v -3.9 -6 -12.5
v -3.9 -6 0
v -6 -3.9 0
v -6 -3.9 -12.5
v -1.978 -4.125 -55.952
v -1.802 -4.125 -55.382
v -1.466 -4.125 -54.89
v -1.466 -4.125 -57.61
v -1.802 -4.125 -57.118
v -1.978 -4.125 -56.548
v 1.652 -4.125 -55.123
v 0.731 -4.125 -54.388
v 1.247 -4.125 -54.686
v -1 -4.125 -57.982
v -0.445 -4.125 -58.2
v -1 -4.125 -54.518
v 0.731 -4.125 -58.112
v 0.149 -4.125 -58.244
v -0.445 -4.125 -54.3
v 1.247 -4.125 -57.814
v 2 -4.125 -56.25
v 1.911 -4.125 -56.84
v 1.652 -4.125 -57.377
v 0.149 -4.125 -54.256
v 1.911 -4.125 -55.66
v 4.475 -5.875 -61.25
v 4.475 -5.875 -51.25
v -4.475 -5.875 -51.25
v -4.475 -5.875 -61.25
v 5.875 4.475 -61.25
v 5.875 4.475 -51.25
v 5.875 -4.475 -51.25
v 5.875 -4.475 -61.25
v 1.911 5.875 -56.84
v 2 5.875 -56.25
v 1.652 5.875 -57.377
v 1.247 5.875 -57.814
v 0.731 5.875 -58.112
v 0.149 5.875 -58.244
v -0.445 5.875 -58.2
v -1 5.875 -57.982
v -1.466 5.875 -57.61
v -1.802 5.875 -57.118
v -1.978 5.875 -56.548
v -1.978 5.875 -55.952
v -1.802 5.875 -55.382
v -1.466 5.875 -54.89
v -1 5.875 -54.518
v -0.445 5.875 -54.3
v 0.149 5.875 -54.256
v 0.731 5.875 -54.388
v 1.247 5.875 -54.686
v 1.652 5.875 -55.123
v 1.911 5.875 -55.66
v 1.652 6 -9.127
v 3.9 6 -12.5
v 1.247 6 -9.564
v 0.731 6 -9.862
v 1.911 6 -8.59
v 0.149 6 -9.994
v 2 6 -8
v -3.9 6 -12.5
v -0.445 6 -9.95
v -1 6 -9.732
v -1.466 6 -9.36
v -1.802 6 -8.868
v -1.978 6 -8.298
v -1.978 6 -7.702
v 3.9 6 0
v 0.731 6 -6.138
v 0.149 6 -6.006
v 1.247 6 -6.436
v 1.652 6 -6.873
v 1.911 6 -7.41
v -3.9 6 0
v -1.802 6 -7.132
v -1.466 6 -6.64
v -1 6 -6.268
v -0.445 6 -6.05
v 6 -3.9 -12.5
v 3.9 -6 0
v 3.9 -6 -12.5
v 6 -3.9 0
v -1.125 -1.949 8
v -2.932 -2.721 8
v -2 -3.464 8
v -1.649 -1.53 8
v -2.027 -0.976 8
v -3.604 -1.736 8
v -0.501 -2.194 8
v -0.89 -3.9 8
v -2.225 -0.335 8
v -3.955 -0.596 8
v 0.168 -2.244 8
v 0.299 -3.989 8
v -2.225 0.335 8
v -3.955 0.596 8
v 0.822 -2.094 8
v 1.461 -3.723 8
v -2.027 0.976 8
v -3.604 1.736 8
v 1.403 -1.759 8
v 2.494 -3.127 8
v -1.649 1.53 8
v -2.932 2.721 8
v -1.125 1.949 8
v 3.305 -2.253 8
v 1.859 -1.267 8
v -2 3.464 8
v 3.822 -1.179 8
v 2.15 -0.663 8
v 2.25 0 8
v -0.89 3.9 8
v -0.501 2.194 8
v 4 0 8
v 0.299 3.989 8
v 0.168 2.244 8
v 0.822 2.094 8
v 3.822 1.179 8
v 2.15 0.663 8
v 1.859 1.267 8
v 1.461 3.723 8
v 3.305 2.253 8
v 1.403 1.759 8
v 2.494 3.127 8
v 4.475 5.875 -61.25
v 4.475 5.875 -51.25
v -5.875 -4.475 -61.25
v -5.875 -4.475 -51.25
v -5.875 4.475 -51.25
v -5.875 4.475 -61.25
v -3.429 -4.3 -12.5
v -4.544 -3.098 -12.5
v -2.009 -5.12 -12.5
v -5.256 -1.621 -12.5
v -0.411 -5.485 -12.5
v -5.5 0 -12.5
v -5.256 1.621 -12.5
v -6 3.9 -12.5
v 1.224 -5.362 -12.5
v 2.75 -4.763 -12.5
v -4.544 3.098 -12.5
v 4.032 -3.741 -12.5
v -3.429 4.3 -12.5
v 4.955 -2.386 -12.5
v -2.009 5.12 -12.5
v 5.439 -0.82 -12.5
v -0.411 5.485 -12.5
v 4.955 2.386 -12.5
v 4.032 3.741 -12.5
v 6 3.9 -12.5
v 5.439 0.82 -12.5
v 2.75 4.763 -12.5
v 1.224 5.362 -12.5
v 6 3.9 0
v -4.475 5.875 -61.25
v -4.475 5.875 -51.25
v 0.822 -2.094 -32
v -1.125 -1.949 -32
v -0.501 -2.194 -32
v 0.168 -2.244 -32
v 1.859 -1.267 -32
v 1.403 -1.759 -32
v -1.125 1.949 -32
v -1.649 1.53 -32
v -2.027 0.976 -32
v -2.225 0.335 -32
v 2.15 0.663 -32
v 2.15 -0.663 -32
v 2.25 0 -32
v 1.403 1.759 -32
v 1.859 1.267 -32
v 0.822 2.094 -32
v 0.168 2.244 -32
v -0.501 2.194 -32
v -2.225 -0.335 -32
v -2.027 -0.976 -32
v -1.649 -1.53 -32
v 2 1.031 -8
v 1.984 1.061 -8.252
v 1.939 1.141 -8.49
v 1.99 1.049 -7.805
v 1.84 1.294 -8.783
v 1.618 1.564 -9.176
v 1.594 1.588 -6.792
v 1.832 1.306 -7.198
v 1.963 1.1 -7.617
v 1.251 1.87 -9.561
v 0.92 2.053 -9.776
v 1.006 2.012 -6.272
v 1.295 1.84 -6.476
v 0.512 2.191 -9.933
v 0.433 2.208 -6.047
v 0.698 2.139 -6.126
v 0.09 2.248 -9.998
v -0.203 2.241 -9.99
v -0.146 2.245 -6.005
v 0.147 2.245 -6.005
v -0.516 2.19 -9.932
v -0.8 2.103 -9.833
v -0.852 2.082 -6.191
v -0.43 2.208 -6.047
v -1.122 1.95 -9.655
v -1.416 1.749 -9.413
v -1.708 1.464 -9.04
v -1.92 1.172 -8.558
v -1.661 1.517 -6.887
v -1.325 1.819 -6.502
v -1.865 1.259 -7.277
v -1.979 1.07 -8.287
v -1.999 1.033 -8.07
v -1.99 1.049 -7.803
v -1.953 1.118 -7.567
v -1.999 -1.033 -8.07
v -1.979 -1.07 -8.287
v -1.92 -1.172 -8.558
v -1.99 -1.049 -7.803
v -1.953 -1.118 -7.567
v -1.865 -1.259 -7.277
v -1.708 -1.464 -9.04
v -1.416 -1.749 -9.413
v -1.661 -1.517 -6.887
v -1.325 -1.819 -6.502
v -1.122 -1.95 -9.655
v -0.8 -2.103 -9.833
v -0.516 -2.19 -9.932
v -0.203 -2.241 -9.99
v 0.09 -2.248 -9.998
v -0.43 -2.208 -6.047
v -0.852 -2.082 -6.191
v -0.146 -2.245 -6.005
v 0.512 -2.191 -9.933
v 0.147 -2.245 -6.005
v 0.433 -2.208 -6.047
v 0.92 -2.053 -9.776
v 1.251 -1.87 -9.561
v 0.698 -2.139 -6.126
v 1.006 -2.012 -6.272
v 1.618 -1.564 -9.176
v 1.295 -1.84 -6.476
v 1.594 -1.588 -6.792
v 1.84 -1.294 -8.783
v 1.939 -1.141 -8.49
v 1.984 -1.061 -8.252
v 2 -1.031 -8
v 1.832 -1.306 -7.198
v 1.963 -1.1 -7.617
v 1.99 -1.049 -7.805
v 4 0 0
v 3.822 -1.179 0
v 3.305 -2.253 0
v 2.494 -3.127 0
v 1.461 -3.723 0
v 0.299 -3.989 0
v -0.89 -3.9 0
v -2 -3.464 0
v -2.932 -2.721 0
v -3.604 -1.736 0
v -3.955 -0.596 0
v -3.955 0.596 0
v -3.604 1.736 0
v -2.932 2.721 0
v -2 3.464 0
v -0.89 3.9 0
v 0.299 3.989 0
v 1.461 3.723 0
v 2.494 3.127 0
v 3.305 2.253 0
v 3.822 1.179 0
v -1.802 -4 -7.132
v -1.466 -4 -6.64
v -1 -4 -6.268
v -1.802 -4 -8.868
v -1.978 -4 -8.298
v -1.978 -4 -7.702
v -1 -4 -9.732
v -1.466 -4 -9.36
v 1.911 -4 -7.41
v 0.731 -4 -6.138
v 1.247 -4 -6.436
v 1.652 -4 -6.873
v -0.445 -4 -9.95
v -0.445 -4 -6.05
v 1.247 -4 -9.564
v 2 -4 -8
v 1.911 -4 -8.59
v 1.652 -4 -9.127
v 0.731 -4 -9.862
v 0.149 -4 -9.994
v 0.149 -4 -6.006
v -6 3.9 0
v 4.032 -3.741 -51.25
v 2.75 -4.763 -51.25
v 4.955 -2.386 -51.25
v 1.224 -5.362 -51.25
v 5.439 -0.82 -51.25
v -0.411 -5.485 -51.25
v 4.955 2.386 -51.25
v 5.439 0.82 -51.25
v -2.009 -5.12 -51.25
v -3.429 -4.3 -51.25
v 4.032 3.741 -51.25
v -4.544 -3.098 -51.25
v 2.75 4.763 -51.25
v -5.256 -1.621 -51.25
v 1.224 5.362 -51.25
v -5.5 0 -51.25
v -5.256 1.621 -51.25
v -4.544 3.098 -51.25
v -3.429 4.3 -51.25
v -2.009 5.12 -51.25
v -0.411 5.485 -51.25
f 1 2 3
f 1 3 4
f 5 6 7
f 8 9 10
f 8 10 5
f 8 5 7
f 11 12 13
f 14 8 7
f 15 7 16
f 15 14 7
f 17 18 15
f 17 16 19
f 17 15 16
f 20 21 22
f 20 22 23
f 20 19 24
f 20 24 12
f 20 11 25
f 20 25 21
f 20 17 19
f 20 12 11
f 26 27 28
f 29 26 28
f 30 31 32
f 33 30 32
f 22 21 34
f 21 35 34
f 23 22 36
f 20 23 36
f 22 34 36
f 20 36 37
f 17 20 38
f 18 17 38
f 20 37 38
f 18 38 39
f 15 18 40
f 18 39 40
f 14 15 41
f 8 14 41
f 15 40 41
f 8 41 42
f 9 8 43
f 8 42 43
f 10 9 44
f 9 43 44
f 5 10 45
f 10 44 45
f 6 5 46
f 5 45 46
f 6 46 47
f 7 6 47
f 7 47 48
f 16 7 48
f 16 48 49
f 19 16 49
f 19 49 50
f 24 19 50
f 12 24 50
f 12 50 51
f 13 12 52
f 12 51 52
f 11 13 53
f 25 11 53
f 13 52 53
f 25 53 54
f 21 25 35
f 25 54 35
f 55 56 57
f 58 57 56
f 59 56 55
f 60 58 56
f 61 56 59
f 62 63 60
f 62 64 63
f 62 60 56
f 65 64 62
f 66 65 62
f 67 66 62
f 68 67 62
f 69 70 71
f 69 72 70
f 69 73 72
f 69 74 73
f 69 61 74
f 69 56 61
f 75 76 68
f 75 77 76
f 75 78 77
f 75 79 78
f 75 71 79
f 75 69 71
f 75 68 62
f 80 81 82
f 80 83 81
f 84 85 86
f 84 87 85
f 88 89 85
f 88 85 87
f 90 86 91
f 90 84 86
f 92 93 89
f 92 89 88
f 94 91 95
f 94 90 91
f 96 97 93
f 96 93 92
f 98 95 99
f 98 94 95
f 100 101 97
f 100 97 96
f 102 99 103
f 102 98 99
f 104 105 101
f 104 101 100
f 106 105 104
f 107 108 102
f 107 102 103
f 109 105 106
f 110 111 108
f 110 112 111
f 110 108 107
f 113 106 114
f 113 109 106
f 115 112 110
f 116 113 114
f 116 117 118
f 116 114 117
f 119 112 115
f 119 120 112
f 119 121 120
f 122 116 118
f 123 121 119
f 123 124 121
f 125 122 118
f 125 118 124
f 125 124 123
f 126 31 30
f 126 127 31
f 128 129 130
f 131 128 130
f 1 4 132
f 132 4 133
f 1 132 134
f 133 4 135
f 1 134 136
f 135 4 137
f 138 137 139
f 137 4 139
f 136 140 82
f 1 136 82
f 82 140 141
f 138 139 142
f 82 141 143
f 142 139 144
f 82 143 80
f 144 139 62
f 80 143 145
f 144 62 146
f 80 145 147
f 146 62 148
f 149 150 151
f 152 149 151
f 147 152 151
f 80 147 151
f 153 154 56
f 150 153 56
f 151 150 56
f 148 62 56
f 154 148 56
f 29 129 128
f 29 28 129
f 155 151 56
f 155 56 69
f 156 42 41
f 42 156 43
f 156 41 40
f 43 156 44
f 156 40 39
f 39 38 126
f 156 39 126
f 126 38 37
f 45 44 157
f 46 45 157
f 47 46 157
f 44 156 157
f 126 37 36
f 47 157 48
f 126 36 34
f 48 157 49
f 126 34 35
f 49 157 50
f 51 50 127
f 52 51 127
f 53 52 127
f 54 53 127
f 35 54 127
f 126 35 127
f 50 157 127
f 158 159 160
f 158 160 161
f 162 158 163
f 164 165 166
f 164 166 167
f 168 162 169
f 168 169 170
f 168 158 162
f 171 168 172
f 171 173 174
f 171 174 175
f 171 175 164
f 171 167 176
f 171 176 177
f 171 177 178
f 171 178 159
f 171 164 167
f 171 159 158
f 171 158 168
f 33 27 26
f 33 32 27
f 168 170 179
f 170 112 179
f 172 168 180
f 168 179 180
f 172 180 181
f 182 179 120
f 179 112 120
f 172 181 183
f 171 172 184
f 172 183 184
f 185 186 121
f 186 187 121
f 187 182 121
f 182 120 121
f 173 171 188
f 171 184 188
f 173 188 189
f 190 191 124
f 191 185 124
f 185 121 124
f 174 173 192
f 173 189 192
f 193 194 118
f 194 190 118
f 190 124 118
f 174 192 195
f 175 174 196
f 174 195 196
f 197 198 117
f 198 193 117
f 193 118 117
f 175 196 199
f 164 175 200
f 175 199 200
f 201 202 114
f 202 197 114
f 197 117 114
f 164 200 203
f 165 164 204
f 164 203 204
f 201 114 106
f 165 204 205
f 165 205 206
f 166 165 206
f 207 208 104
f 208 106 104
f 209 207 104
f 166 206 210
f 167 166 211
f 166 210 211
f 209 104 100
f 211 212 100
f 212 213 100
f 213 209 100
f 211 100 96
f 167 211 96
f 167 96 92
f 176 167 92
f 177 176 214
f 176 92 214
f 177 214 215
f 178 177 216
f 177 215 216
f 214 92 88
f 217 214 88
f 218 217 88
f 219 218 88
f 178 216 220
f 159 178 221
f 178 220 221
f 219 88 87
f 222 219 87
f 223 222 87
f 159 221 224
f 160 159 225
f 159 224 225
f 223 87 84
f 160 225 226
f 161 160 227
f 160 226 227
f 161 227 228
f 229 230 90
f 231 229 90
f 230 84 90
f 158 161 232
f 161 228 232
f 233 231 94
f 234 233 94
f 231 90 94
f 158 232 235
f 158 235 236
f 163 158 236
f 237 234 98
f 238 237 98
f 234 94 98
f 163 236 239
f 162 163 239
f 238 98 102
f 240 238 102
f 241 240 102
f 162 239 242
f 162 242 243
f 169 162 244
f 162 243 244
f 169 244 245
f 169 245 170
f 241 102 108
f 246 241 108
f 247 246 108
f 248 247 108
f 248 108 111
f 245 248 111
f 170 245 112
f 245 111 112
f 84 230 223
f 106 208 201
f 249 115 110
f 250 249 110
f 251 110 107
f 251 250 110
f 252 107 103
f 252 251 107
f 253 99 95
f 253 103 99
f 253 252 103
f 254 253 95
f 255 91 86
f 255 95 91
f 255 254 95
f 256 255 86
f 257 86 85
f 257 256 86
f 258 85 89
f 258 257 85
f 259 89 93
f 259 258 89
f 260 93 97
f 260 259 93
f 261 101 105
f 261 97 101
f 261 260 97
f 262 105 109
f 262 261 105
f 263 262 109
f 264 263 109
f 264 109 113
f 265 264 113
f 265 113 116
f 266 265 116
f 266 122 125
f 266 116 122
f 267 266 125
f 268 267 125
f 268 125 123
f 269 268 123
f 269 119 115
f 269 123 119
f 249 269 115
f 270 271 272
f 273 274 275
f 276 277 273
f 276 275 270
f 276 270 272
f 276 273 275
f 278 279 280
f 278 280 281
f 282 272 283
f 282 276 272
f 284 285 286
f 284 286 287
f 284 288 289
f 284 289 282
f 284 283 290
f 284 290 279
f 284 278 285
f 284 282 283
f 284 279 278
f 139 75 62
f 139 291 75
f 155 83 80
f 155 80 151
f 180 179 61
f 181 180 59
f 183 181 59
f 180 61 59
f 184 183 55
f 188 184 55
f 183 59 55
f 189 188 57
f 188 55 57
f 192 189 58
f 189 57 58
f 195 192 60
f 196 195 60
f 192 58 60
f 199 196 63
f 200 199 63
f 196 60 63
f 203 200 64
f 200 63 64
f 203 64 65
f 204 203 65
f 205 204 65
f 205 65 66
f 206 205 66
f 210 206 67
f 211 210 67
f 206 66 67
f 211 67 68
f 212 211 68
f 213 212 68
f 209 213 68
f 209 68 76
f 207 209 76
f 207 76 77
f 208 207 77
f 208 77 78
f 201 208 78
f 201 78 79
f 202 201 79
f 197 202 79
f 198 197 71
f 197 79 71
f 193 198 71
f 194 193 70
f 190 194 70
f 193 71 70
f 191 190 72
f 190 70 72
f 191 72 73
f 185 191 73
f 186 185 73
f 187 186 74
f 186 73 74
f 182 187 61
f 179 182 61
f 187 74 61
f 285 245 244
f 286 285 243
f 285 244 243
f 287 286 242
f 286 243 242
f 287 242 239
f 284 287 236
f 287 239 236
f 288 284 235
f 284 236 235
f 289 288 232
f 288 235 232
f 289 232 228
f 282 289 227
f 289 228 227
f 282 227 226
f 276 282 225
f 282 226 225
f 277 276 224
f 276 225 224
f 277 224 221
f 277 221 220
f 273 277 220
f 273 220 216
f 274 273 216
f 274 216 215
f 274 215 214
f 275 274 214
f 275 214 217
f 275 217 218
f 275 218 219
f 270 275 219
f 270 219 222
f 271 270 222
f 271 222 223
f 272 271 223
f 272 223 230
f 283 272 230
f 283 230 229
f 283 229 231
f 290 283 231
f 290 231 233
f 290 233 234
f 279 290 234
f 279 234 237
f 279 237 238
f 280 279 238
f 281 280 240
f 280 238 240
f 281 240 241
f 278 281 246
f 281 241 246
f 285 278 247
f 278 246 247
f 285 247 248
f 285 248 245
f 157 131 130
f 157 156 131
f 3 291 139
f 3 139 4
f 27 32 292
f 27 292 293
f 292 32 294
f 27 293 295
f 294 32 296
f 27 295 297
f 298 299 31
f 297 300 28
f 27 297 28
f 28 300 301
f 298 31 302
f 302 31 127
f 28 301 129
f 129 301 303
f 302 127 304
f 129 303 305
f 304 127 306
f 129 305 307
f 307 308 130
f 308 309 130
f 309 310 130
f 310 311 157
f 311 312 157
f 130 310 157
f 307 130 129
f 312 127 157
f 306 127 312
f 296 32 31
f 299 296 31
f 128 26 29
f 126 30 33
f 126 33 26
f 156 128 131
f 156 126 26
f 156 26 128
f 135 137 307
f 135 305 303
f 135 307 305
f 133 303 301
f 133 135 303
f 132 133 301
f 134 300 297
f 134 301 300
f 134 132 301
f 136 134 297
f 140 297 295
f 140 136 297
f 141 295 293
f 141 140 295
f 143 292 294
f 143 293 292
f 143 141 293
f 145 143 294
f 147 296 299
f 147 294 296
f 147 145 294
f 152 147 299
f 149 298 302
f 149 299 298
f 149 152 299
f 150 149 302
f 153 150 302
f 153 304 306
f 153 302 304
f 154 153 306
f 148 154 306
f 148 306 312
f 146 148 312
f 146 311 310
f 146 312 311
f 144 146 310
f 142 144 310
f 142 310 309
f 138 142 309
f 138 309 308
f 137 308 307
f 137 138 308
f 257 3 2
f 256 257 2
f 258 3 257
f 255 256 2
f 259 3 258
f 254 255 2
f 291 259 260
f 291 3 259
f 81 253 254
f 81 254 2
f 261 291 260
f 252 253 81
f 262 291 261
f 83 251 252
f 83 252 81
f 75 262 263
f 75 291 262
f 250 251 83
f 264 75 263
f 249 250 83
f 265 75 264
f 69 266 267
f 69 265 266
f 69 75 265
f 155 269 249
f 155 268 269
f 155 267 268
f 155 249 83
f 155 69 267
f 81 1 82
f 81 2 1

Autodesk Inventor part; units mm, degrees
ref_plane "YZ Plane" through (0, 0, 0) normal (1, 0, 0) x (0, 1, 0)
ref_plane "XZ Plane" through (0, 0, 0) normal (0, 1, 0) x (-1, 0, 0)
ref_plane "XY Plane" through (0, 0, 0) normal (0, 0, 1) x (1, 0, 0)
sketch "スケッチ1" plane through (0, 0, 0) normal (0, 0, 1) x (1, 0, 0)
  circle A0 centre (0, 0) radius 4
  dimension "d0" = 8
extrude "押し出し1" add sketch "スケッチ1" along normal blind 8
sketch "スケッチ2" plane through (0, 0, 0) normal (0, 0, 1) x (1, 0, 0)
  line L0 (-6, -6) -> (6, -6)
  line L1 (6, -6) -> (6, 6)
  line L2 (6, 6) -> (-6, 6)
  line L3 (-6, 6) -> (-6, -6)
  line L4 (-6, -6) -> (6, 6) construction
  line L5 (6, -6) -> (-6, 6) construction
  point P0 (0, 0)
  dimension "d3" = 12
  dimension "d4" = 12
extrude "押し出し2" add sketch "スケッチ2" against normal blind 12.5
chamfer "面取り1" distance 2.1 angle 45 1 edges at (6, 6, -6.25)
chamfer "面取り2" distance 2.1 angle 45 1 edges at (-6, 6, -6.25)
chamfer "面取り3" distance 2.1 angle 45 1 edges at (-6, -6, -6.25)
chamfer "面取り4" distance 2.1 angle 45 1 edges at (6, -6, -6.25)
sketch "スケッチ3" plane through (0, 0, -12.5) normal (0, 0, -1) x (-1, 0, 0)
  circle A0 centre (0, 0) radius 5.5
  dimension "d19" = 11
extrude "押し出し3" add sketch "スケッチ3" along normal blind 38.75
sketch "スケッチ4" plane through (0, 0, -51.25) normal (0, 0, -1) x (-1, 0, 0)
  line L0 (5.875, 5.875) -> (-5.875, 5.875)
  line L1 (-5.875, 5.875) -> (-5.875, -5.875)
  line L2 (-5.875, -5.875) -> (5.875, -5.875)
  line L3 (5.875, -5.875) -> (5.875, 5.875)
  line L4 (5.875, 5.875) -> (-5.875, -5.875) construction
  line L5 (-5.875, 5.875) -> (5.875, -5.875) construction
  point P0 (0, 0)
  dimension "d22" = 11.75
  dimension "d23" = 11.75
extrude "押し出し4" add sketch "スケッチ4" along normal blind 10
chamfer "面取り5" distance 1.4 angle 45 1 edges at (-5.875, -5.875, -56.25)
chamfer "面取り6" distance 1.4 angle 45 1 edges at (-5.875, 5.875, -56.25)
chamfer "面取り7" distance 1.4 angle 45 1 edges at (5.875, -5.875, -56.25)
chamfer "面取り8" distance 1.4 angle 45 1 edges at (5.875, 5.875, -56.25)
sketch "スケッチ5" plane through (3.9, 6, 0) normal (0, 1, 0) x (1, 0, 0)
  circle A0 centre (-3.9, 8) radius 2
  point P0 (-3.9, 0)
  dimension "d38" = 4
  dimension "d39" = 8
extrude "押し出し5" cut sketch "スケッチ5" against normal blind 10
sketch "スケッチ6" plane through (-4.475, 5.875, -51.25) normal (0, 1, 0) x (1, 0, 0)
  circle A0 centre (4.475, 5) radius 2
  line L0 (0, 0) -> (8.95, 0) projected
  point P0 (4.475, -51.25)
  dimension "d42" = 4
  dimension "d43" = 5
extrude "押し出し6" cut sketch "スケッチ6" against normal blind 10
sketch "スケッチ7" plane through (0, 0, 8) normal (0, 0, 1) x (1, 0, 0)
  circle A0 centre (0, 0) radius 2.25
  dimension "d46" = 4.5
extrude "押し出し7" cut sketch "スケッチ7" against normal blind 40
properties part number "air_cylinder_15_part1_sa" material "アルミニウム 6061-AHC"
